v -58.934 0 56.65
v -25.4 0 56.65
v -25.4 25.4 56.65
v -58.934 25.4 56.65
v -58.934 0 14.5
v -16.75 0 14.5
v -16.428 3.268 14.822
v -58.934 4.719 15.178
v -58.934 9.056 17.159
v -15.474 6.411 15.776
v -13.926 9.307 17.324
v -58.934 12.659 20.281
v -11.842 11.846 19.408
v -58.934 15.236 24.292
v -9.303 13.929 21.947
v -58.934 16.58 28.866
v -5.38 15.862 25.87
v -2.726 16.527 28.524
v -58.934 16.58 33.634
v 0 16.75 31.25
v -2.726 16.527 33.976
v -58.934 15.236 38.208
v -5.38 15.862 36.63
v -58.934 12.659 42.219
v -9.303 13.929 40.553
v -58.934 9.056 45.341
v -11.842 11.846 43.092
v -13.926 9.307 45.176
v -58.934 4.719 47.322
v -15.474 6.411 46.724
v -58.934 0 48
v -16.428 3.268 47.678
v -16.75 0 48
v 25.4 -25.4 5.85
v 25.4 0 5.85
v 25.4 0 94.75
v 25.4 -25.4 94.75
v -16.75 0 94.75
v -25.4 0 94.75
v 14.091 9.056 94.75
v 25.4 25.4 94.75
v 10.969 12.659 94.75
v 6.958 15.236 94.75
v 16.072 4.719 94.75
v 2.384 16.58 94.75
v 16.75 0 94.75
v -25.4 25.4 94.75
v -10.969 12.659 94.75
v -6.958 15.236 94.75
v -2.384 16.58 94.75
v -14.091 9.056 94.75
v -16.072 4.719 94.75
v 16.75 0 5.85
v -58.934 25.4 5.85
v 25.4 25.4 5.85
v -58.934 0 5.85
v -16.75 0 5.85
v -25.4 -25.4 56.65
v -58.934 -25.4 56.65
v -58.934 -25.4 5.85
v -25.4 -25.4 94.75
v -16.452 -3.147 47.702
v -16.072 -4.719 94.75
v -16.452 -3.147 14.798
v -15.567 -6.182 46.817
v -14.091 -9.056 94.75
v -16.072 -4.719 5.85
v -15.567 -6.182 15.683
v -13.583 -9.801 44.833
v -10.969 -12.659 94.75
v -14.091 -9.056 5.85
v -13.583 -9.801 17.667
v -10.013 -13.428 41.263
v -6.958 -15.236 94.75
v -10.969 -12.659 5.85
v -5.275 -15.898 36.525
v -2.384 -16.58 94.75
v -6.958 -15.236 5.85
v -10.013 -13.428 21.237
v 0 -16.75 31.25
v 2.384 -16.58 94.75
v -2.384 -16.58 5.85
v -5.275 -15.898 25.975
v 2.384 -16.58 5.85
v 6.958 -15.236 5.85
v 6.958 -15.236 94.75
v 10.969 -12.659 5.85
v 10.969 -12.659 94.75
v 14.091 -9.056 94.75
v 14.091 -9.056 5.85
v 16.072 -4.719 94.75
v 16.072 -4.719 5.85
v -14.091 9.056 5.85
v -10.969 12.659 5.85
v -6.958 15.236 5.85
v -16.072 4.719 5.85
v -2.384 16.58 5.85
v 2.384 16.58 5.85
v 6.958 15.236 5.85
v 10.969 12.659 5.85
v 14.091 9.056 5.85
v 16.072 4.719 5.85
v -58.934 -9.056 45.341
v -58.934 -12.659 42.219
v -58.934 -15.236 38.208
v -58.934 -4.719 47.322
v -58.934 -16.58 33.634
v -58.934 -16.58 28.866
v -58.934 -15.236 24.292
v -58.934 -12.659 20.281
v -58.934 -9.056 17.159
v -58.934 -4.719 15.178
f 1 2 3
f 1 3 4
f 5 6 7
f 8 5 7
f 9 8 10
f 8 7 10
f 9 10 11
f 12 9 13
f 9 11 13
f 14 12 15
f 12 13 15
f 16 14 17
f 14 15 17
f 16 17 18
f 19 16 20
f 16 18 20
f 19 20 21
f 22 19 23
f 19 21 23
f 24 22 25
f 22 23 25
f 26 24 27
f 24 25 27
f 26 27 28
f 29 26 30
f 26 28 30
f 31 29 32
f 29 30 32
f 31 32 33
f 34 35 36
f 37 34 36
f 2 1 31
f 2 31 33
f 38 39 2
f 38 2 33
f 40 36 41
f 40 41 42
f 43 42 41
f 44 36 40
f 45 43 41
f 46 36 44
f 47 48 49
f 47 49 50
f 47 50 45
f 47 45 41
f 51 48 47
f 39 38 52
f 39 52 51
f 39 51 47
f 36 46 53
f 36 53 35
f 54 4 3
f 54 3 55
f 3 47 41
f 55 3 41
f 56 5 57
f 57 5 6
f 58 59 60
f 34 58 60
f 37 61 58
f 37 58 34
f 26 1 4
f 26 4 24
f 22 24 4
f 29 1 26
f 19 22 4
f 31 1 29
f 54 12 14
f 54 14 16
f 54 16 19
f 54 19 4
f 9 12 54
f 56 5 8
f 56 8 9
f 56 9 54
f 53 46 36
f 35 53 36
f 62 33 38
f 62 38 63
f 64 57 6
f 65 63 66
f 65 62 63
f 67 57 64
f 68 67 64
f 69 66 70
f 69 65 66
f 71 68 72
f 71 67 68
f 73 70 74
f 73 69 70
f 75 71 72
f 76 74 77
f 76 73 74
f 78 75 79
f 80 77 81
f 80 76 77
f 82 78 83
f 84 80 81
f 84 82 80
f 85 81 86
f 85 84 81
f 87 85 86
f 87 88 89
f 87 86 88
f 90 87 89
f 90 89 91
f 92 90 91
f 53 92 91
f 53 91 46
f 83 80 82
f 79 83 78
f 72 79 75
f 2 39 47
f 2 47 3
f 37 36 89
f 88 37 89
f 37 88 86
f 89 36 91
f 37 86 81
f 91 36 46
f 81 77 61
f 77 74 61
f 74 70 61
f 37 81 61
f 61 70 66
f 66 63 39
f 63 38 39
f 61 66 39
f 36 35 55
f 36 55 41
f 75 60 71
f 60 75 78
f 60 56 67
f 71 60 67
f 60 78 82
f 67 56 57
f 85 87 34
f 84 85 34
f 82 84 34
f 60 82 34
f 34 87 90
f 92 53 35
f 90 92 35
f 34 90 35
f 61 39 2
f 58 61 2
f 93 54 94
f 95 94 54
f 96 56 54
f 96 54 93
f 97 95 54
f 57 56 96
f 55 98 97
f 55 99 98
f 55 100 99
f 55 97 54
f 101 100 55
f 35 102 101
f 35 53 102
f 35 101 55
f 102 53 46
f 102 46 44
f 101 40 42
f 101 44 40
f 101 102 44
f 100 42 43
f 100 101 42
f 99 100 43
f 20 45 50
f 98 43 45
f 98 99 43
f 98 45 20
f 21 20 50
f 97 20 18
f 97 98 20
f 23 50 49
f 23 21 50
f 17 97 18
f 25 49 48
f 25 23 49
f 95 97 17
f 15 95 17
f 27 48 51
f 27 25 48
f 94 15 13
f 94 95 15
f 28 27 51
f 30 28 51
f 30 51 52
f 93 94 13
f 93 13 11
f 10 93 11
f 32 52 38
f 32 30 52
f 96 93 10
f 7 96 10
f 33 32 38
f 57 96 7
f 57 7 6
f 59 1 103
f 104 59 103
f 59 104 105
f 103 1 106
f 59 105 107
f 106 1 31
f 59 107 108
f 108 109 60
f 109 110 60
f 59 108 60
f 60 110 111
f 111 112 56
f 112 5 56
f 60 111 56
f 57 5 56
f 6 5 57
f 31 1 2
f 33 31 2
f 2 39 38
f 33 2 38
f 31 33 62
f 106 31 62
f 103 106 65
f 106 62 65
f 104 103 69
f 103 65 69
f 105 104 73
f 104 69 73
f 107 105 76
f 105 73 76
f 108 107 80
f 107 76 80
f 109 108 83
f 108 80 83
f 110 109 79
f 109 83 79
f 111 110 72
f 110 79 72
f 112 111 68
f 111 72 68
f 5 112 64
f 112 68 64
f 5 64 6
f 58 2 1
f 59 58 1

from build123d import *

# Parameters (mm, degrees)
F3_DEPTH = 25.4
F4_DEPTH = 25.4
F0_R     = 16.75
F5_DEPTH = 152.4
F1_R     = 16.75
F6_DEPTH = 157.48


with BuildPart() as f3:
    # F2 (on Front) → F3 (new body)
    with BuildSketch(Plane.XZ):
        Polygon((-25.4, 56.65), (-58.934118, 56.65), (-58.934118, 5.85), (25.4, 5.85), (25.4, 94.75), (-25.4, 94.75), align=None)
    extrude(amount=F3_DEPTH)


with BuildPart() as f4:
    # F2 (on Front) → F4 (new body)
    with BuildSketch(Plane.XZ):
        Polygon((-25.4, 56.65), (-58.934118, 56.65), (-58.934118, 5.85), (25.4, 5.85), (25.4, 94.75), (-25.4, 94.75), align=None)
    extrude(amount=-F4_DEPTH)


with BuildPart() as f5_tool:
    # F0 (on Top) → F5 (new body)
    with BuildSketch(Plane.XY):
        Circle(F0_R)
    extrude(amount=F5_DEPTH)


with BuildPart() as f3_1:
    add(f3.part)

    # F5: cut by f5_tool
    add(f5_tool.part, mode=Mode.SUBTRACT)


with BuildPart() as f4_1:
    add(f4.part)

    # F5: cut by f5_tool
    add(f5_tool.part, mode=Mode.SUBTRACT)


with BuildPart() as f6_tool:
    # F1 (on Right) → F6 (new body)
    with BuildSketch(Plane.YZ):
        with Locations((0, 31.25)):
            Circle(F1_R)
    extrude(amount=-F6_DEPTH)


with BuildPart() as f3_2:
    add(f3_1.part)

    # F6: cut by f6_tool
    add(f6_tool.part, mode=Mode.SUBTRACT)


with BuildPart() as f4_2:
    add(f4_1.part)

    # F6: cut by f6_tool
    add(f6_tool.part, mode=Mode.SUBTRACT)


solid = Compound([f3_2.part, f4_2.part])
